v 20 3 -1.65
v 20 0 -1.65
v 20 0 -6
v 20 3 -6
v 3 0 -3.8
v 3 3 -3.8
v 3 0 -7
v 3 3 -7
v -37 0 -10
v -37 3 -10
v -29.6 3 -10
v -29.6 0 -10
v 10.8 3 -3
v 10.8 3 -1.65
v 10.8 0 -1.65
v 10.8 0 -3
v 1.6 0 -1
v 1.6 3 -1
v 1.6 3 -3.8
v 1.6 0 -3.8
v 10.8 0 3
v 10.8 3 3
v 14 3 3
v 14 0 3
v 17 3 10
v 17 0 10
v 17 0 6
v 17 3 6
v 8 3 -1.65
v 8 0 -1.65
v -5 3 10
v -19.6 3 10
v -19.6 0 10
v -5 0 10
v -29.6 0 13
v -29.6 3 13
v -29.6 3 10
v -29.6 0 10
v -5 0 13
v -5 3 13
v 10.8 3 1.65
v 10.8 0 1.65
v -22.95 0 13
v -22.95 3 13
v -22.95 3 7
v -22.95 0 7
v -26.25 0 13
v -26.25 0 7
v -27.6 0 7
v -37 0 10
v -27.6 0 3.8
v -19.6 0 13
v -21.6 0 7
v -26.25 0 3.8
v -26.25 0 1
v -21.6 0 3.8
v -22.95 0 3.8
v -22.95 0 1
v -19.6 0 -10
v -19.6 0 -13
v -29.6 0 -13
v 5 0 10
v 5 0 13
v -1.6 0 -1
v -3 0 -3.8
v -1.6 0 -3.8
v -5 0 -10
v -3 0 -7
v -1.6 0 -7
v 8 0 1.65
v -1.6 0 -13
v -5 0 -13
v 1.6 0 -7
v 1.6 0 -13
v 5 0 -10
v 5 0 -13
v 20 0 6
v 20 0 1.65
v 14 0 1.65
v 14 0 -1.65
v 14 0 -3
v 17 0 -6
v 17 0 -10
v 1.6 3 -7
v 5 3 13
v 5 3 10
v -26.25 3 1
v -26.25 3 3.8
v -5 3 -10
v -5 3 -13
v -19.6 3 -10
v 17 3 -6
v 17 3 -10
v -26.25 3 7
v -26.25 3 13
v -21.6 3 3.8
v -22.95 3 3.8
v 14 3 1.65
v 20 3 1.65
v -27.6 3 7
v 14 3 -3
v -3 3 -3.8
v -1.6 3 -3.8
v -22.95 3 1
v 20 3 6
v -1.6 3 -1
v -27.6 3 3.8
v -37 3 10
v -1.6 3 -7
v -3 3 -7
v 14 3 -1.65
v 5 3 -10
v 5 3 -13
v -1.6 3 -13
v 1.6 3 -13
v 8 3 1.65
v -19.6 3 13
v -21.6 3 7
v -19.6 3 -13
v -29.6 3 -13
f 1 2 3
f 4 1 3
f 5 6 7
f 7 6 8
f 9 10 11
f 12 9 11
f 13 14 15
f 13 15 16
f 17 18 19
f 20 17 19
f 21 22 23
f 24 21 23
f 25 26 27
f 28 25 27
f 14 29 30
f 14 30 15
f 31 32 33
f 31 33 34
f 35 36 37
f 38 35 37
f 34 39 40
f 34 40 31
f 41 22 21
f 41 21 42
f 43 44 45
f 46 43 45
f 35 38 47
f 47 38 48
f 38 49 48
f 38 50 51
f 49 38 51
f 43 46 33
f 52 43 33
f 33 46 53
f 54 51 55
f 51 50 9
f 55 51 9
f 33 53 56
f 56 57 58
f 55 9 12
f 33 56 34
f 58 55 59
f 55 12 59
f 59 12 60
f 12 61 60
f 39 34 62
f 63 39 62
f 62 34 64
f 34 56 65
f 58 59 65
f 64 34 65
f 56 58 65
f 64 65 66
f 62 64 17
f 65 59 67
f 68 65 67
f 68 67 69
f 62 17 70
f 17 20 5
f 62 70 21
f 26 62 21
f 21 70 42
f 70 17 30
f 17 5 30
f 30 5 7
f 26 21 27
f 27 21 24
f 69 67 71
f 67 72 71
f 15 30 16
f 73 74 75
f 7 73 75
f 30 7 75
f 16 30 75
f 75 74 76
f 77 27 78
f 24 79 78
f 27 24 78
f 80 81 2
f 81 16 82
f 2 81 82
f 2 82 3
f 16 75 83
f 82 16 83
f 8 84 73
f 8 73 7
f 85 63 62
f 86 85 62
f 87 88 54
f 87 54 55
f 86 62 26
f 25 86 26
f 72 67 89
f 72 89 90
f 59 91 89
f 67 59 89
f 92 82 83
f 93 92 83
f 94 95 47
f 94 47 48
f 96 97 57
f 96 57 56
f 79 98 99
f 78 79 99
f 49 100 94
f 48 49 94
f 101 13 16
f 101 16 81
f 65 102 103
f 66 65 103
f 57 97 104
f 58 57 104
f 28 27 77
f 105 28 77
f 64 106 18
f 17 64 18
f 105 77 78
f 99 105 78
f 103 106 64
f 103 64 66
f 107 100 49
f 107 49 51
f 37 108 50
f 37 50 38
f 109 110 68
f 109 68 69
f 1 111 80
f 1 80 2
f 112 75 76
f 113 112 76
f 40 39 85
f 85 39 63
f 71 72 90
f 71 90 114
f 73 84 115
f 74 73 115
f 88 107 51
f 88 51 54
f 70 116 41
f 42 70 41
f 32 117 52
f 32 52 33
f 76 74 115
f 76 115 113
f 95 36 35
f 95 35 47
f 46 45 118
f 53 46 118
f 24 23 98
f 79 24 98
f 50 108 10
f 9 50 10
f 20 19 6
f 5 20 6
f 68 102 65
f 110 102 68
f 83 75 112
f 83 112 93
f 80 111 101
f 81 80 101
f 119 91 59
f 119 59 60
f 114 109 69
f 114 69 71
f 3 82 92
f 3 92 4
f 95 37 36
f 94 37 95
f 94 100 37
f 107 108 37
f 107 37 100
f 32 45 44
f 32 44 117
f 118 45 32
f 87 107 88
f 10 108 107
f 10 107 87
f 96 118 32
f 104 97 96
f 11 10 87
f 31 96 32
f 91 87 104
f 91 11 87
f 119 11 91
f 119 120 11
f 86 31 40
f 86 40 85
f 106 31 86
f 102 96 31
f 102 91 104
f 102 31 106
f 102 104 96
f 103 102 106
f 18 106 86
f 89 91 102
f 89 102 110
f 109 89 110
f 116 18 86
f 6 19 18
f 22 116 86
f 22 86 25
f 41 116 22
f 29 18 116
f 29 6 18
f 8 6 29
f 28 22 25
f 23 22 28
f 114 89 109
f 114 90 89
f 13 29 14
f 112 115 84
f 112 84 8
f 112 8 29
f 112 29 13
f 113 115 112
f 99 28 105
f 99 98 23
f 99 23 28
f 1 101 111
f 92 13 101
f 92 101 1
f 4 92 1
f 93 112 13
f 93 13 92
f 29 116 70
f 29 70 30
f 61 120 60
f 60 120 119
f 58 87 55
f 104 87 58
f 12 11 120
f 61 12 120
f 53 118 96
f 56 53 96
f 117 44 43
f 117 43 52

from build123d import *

# Parameters (mm, degrees)
SKETCH_1_W          = 34
SKETCH_1_H          = 20
SKETCH_1_W_2        = 3
SKETCH_1_H_2        = 12
SKETCH_1_W_3        = 10
SKETCH_1_H_3        = 3
EXTRUDE_1_DEPTH     = 3
SKETCH_2_W          = 2.8
SKETCH_2_H          = 3.3
SKETCH_2_W_2        = 3.2
SKETCH_2_H_2        = 1.35
SKETCH_2_W_3        = 6
CUT_EXTRUDE_1_DEPTH = 3
SKETCH_4_W          = 20
SKETCH_4_H          = 20
SKETCH_4_W_2        = 10
SKETCH_4_H_2        = 3
EXTRUDE_2_DEPTH     = 3
SKETCH_5_W          = 3.2
SKETCH_5_H          = 2.8
SKETCH_5_W_2        = 1.4
SKETCH_5_H_2        = 3.2
SKETCH_5_H_3        = 6
SKETCH_5_W_3        = 1.35
SKETCH_5_W_4        = 3.3
CUT_EXTRUDE_2_DEPTH = 3


with BuildPart() as part:
    # 草图1 → 凸台-拉伸1 (new body)
    with BuildSketch(Plane(origin=(0, 0, 0), x_dir=(1, 0, 0), z_dir=(0, 1, 0))):
        Rectangle(SKETCH_1_W, SKETCH_1_H)
        with Locations((18.5, 0)):
            Rectangle(SKETCH_1_W_2, SKETCH_1_H_2)
        with Locations((0, 11.5)):
            Rectangle(SKETCH_1_W_3, SKETCH_1_H_3)
        with Locations((0, -11.5)):
            Rectangle(SKETCH_1_W_3, SKETCH_1_H_3)
    extrude(amount=EXTRUDE_1_DEPTH)

    # 草图2 → 切除-拉伸1 (cut)
    with BuildSketch(Plane(origin=(0, 3, 0), x_dir=(1, 0, 0), z_dir=(0, 1, 0))):
        with Locations((9.4, 0)):
            Rectangle(SKETCH_2_W, SKETCH_2_H)
        with Locations((12.4, 2.325)):
            Rectangle(SKETCH_2_W_2, SKETCH_2_H_2)
        with Locations((12.4, 0)):
            Rectangle(SKETCH_2_W_2, SKETCH_2_H)
        with Locations((12.4, -2.325)):
            Rectangle(SKETCH_2_W_2, SKETCH_2_H_2)
        with Locations((17, 0)):
            Rectangle(SKETCH_2_W_3, SKETCH_2_H)
    extrude(amount=-CUT_EXTRUDE_1_DEPTH, mode=Mode.SUBTRACT)

    # 草图4 → 凸台-拉伸2 (add)
    with BuildSketch(Plane(origin=(0, 3, 0), x_dir=(1, 0, 0), z_dir=(0, 1, 0))):
        with Locations((-27, 0)):
            Rectangle(SKETCH_4_W, SKETCH_4_H)
        with Locations((-24.6, 11.5)):
            Rectangle(SKETCH_4_W_2, SKETCH_4_H_2)
        with Locations((-24.6, -11.5)):
            Rectangle(SKETCH_4_W_2, SKETCH_4_H_2)
    extrude(amount=-EXTRUDE_2_DEPTH)

    # 草图5 → 切除-拉伸2 (cut)
    with BuildSketch(Plane(origin=(0, 3, 0), x_dir=(1, 0, 0), z_dir=(0, 1, 0))):
        with Locations((0, 2.4)):
            Rectangle(SKETCH_5_W, SKETCH_5_H)
        with Locations((-2.3, 5.4)):
            Rectangle(SKETCH_5_W_2, SKETCH_5_H_2)
        with Locations((0, 10)):
            Rectangle(SKETCH_5_W, SKETCH_5_H_3)
        with Locations((0, 5.4)):
            Rectangle(SKETCH_5_W, SKETCH_5_H_2)
        with Locations((2.3, 5.4)):
            Rectangle(SKETCH_5_W_2, SKETCH_5_H_2)
        with Locations((-26.925, -5.4)):
            Rectangle(SKETCH_5_W_3, SKETCH_5_H_2)
        with Locations((-24.6, -2.4)):
            Rectangle(SKETCH_5_W_4, SKETCH_5_H)
        with Locations((-22.275, -5.4)):
            Rectangle(SKETCH_5_W_3, SKETCH_5_H_2)
        with Locations((-24.6, -5.4)):
            Rectangle(SKETCH_5_W_4, SKETCH_5_H_2)
        with Locations((-24.6, -10)):
            Rectangle(SKETCH_5_W_4, SKETCH_5_H_3)
    extrude(amount=-CUT_EXTRUDE_2_DEPTH, mode=Mode.SUBTRACT)


solid = part.part
